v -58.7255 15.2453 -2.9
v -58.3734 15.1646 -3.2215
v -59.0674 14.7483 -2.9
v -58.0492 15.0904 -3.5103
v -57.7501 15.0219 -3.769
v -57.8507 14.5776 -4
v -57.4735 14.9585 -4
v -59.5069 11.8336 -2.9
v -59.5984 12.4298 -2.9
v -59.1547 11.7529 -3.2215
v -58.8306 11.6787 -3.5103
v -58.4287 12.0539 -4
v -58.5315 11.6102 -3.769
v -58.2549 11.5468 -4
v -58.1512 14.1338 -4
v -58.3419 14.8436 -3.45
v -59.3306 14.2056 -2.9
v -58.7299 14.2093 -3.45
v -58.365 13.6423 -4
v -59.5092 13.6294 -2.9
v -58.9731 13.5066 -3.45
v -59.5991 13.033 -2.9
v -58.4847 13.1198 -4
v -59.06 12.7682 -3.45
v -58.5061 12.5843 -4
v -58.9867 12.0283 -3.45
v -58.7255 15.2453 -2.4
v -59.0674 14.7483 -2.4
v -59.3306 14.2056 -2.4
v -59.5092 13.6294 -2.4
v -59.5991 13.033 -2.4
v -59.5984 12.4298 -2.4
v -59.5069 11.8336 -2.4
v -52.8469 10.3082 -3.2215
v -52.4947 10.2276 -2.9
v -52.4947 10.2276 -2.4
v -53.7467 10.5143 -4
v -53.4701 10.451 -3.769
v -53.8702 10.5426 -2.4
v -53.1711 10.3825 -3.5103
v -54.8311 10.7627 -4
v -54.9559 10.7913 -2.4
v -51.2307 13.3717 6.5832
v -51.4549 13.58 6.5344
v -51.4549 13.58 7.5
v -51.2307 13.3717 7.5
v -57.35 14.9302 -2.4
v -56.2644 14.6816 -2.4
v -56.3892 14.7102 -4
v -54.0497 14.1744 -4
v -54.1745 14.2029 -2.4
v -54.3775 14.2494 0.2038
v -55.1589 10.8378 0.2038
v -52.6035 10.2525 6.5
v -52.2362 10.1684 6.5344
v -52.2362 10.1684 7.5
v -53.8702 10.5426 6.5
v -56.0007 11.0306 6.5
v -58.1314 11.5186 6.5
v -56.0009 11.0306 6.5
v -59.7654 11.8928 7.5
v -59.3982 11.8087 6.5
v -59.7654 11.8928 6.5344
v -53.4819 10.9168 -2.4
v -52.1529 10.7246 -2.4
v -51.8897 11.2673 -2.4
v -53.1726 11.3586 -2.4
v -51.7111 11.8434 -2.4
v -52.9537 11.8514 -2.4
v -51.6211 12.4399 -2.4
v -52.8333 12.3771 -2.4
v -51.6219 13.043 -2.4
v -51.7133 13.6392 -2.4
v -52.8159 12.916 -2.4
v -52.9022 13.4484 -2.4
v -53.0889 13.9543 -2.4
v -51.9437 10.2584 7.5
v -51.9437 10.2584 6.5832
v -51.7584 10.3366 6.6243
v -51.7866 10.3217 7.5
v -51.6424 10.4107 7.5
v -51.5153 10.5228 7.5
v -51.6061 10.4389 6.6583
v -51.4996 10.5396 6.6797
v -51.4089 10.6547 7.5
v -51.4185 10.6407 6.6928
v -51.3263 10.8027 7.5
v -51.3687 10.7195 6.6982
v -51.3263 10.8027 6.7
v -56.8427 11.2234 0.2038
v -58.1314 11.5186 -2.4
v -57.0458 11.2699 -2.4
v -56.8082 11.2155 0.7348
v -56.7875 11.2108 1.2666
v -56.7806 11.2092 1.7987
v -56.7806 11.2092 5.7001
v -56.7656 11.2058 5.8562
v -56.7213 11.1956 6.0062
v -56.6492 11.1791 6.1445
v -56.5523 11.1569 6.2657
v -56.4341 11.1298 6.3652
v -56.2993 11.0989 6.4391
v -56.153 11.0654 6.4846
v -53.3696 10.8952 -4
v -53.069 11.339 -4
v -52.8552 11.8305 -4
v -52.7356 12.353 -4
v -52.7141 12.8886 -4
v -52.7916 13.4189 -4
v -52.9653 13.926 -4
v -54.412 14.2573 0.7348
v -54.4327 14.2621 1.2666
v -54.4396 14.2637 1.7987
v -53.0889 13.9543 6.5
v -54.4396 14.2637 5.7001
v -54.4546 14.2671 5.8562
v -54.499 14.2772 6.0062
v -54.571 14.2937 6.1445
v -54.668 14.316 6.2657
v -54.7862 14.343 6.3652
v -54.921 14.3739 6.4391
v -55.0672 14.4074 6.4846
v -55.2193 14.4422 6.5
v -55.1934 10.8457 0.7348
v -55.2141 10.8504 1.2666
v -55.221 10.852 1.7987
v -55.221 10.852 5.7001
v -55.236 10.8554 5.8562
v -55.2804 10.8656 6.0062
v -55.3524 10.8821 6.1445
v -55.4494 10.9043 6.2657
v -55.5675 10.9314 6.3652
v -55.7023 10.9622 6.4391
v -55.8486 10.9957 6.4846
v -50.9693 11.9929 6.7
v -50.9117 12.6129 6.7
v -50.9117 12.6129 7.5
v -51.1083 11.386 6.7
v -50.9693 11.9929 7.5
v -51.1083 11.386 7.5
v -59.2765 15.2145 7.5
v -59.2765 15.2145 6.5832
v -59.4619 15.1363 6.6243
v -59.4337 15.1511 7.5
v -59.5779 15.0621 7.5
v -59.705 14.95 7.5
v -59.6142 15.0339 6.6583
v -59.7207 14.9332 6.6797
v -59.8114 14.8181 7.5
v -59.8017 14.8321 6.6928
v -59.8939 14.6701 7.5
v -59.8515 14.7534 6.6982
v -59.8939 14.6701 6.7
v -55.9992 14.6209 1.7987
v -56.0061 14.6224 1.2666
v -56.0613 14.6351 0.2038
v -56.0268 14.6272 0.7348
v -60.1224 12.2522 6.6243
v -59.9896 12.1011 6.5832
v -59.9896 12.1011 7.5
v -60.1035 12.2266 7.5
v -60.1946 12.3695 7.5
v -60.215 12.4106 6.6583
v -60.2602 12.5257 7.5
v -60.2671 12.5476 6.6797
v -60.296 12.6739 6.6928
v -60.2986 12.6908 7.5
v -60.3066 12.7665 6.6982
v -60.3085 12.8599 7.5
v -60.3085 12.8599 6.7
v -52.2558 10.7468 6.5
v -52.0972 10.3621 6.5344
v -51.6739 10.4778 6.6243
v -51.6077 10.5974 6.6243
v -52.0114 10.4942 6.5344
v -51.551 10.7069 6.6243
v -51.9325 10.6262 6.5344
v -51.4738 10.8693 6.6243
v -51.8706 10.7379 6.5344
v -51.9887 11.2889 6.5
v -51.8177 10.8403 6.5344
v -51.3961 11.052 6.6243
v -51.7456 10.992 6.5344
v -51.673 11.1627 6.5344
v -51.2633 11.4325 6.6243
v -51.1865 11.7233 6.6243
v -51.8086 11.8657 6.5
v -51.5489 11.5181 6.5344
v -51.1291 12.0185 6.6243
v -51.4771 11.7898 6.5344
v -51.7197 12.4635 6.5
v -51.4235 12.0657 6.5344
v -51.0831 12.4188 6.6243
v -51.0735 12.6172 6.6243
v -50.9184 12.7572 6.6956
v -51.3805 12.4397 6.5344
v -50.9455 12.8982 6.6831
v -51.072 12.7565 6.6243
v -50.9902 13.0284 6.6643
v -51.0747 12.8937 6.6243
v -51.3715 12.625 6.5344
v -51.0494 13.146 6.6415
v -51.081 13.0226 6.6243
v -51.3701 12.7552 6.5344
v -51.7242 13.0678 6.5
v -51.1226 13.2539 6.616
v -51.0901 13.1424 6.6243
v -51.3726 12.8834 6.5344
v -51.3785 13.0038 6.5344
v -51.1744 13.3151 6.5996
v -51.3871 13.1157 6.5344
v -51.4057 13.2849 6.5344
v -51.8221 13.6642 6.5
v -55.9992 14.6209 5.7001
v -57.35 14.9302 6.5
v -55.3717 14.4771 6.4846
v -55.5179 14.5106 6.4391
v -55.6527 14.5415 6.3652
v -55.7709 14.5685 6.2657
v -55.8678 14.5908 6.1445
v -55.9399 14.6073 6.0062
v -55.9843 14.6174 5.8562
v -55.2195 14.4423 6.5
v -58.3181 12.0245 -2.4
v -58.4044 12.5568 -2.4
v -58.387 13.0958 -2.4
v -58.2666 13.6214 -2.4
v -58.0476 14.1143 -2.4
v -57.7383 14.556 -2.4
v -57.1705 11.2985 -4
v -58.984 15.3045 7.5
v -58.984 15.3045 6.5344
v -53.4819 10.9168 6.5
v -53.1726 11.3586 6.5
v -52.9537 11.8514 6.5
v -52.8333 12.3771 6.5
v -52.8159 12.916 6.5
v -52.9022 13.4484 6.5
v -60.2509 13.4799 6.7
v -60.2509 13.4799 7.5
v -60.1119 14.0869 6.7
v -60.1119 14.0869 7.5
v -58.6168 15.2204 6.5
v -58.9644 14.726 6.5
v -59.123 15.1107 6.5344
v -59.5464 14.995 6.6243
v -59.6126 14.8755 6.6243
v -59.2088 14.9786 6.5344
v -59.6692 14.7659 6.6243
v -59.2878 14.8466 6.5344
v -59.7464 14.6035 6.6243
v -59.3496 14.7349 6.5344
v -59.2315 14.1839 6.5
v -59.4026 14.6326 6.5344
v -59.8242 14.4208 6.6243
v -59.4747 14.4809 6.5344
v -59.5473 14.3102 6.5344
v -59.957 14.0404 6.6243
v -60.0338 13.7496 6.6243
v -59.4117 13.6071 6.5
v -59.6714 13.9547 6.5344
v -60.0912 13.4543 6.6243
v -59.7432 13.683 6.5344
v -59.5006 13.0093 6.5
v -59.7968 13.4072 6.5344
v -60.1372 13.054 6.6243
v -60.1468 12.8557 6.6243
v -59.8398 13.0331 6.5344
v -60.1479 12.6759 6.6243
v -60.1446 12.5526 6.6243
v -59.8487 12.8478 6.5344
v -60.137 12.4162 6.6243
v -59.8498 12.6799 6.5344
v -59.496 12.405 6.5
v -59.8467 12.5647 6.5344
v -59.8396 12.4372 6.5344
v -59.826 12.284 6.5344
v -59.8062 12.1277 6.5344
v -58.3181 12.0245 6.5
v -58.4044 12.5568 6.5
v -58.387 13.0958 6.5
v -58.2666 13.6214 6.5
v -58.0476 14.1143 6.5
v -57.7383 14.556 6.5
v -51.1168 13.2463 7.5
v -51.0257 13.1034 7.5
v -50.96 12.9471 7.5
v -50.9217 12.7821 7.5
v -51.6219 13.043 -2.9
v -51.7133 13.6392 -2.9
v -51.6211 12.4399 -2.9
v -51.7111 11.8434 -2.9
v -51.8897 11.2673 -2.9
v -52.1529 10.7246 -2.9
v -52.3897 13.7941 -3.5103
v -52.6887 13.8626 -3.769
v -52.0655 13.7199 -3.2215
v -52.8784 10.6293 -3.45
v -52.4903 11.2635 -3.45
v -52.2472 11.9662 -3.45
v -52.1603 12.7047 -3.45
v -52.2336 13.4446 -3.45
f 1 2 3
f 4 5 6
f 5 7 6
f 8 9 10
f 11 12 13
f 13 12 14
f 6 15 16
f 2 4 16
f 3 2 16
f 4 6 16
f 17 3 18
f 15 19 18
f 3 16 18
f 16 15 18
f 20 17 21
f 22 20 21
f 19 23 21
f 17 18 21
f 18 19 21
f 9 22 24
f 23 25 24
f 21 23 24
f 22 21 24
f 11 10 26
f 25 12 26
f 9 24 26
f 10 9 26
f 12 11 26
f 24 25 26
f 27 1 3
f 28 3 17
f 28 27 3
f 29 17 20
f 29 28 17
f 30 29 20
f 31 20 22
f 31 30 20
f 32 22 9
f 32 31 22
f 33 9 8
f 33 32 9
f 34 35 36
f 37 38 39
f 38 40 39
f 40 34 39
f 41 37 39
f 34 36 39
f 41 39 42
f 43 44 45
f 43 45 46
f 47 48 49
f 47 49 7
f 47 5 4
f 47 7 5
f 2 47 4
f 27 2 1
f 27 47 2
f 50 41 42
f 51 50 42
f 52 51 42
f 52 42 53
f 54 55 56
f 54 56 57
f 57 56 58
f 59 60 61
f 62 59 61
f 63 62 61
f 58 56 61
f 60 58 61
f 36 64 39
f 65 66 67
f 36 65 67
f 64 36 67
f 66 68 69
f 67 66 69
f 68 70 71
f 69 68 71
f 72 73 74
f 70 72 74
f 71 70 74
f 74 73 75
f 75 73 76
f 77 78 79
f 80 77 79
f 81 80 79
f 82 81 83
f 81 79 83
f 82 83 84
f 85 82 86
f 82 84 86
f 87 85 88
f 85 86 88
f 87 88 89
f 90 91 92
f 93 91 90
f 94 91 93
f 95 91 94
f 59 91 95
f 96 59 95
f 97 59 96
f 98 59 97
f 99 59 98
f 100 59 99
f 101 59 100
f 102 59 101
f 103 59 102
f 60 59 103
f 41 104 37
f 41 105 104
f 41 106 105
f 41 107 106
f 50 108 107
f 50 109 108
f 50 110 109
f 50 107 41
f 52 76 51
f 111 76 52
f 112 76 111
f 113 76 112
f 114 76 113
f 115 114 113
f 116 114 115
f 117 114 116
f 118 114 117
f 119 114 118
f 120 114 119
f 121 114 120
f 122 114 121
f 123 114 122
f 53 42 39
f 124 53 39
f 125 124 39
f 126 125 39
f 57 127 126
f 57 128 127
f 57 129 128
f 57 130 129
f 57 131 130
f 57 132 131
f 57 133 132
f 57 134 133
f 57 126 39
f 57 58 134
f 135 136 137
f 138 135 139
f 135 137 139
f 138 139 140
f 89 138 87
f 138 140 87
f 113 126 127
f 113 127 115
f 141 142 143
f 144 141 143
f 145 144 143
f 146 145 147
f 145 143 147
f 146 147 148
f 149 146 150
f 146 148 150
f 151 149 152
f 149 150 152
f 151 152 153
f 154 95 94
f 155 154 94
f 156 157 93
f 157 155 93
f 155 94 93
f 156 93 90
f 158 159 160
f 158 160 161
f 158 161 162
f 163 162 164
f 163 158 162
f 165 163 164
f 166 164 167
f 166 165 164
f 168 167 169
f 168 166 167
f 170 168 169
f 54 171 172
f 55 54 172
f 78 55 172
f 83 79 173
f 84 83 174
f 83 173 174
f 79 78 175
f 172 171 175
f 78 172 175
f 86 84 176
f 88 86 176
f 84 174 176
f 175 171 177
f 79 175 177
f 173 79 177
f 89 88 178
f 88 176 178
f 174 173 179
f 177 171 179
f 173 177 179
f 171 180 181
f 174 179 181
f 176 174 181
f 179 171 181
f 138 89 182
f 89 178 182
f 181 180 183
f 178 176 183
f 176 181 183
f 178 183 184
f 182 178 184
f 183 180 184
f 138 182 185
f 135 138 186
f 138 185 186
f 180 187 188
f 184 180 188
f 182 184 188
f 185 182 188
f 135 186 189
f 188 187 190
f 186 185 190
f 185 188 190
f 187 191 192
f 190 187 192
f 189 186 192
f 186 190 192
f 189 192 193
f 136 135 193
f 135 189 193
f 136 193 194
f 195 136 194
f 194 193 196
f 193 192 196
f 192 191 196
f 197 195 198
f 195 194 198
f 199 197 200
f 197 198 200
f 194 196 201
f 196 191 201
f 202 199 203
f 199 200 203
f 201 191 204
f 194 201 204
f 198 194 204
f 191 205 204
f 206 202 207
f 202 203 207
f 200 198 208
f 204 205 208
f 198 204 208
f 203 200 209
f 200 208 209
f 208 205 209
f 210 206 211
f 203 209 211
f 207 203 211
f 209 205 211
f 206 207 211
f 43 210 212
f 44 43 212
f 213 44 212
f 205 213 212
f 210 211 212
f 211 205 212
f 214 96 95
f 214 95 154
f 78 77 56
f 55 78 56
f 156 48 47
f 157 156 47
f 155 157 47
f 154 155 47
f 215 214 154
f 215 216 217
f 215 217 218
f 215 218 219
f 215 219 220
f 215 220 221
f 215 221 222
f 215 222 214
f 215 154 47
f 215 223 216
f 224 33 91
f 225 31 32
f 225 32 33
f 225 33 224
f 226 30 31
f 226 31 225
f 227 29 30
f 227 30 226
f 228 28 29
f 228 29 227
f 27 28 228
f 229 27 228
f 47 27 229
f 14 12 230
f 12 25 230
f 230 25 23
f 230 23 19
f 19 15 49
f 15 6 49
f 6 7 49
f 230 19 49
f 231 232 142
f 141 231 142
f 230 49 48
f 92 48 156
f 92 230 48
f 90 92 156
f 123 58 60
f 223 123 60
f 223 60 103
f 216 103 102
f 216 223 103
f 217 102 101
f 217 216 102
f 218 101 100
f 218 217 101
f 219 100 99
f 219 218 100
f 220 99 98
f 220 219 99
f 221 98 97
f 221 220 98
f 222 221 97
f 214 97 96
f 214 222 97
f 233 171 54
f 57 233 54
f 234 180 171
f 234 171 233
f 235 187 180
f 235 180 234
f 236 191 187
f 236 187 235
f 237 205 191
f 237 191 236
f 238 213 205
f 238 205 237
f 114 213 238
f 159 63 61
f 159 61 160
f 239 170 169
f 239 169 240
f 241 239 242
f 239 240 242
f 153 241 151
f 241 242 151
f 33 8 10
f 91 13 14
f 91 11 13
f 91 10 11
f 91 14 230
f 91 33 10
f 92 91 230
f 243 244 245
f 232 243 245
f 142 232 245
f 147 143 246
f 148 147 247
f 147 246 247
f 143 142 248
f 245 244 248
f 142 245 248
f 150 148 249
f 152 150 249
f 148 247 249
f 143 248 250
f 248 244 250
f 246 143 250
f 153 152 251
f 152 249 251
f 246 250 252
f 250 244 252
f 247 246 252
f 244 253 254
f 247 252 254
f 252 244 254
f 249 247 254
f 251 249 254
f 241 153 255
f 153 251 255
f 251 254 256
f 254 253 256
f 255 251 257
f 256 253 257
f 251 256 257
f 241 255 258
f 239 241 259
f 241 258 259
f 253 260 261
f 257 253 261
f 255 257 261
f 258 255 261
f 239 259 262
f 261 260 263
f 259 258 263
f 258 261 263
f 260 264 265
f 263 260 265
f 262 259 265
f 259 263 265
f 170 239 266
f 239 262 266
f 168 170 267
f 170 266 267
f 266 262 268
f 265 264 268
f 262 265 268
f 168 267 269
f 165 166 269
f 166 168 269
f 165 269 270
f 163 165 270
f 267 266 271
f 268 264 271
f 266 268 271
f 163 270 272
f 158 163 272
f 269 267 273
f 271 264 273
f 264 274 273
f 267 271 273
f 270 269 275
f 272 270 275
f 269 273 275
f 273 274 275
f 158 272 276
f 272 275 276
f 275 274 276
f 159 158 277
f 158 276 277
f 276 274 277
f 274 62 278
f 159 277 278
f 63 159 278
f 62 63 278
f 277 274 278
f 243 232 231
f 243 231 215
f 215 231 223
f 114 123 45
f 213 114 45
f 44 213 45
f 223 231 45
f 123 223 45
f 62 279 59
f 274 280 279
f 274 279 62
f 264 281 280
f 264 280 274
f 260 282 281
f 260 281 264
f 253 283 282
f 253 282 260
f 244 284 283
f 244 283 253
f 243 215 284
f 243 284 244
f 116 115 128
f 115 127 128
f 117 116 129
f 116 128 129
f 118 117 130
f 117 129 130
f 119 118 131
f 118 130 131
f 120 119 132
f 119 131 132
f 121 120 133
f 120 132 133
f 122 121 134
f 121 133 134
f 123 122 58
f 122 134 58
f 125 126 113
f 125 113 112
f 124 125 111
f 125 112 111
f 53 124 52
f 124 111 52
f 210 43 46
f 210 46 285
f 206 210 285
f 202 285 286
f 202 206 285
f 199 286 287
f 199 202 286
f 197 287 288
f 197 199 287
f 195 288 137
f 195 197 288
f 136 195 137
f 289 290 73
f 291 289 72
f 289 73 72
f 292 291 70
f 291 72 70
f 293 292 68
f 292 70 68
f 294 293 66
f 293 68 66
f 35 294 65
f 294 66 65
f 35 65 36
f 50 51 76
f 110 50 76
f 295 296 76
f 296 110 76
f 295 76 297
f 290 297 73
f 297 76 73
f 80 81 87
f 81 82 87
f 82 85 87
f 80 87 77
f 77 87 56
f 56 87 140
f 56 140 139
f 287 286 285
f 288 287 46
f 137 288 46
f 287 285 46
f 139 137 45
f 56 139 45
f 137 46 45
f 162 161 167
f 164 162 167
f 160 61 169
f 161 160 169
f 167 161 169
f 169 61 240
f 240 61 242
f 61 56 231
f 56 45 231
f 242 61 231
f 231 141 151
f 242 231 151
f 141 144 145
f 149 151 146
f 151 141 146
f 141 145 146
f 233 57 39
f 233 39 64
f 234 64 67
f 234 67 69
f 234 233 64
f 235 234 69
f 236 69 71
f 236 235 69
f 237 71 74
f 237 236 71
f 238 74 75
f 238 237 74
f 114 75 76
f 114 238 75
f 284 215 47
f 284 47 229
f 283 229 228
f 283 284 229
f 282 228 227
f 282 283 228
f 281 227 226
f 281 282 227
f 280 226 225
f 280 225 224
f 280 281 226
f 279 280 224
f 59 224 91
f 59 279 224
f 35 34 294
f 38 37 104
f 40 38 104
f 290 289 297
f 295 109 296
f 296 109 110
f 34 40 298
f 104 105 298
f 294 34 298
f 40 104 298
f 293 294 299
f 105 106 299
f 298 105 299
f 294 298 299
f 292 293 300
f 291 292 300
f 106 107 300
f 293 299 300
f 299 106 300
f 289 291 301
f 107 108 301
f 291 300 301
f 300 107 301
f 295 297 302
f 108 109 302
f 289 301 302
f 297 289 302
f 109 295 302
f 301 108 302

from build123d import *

# Parameters (mm, degrees)
BOSS_EXTRUDE1_DEPTH     = 1
CHAMFER1_SIZE           = 0.5
FILLET1_R               = 1
BOSS_EXTRUDE2_DEPTH     = 8.9
BOSS_EXTRUDE3_DEPTH     = 1.6
CUT_EXTRUDE1_DEPTH      = 63.654658492
CUT_EXTRUDE1_DEPTH_BACK = 63.654658492
FILLET2_R               = 20
FILLET3_R               = 0.8


# Some blends are built 0.0001 mm under size
with BuildPart() as part:
    # Sketch3 → Boss-Extrude1 (new body)
    with BuildSketch(Plane.XY.offset(7.5)):
        with BuildLine():
            Line((-59.471397705, 15.416079883), (-50.967479146, 13.468422533))
            ThreePointArc((-50.967479146, 13.468422533), (-51.028748516, 11.687143573), (-51.748854552, 10.056758353))
            Line((-51.748854552, 10.056758353), (-60.252773111, 12.004415704))
            ThreePointArc((-60.252773111, 12.004415704), (-60.191503741, 13.785694664), (-59.471397705, 15.416079883))
        make_face()
    extrude(amount=-BOSS_EXTRUDE1_DEPTH)

    # Chamfer1
    # the kernel refuses this chamfer: 0.5, 0.404802776 mm, written as the material it takes off along each edge
    with BuildSketch(Plane(origin=(-59.471397705, 15.416079883, 8.793542877), x_dir=(0.9747611941912204, -0.2232501160109568, 0), z_dir=(0, 0, -1))) as chamfer1_piece_1:
        with BuildLine():
            Line((CHAMFER1_SIZE, 0), (-0.128607842, 0.362926907))
            ThreePointArc((-0.128607842, 0.362926907), (-0.070555149, 0.18731274), (0, 0))
            Line((0, 0), (CHAMFER1_SIZE, 0))
        make_face()
    extrude(amount=3.587085755, mode=Mode.SUBTRACT)
    with BuildSketch(Plane(origin=(-50.967479146, 13.468422533, 8.793542877), x_dir=(-0.9747611941912215, 0.22325011601095288, 0), z_dir=(0, 0, -1)), Plane(origin=(-60.252773111, 12.004415704, 8.793542877), x_dir=(0.9747611941912214, -0.22325011601095318, 0), z_dir=(0, 0, -1))) as chamfer1_piece_2:
        with BuildLine():
            Line((CHAMFER1_SIZE, 0), (-0.128607842, -0.362926907))
            ThreePointArc((-0.128607842, -0.362926907), (-0.070555149, -0.18731274), (0, 0))
            Line((0, 0), (CHAMFER1_SIZE, 0))
        make_face()
    extrude(amount=3.587085755, mode=Mode.SUBTRACT)
    with BuildSketch(Plane(origin=(-51.748854552, 10.056758353, 8.793542877), x_dir=(0.5360100963407745, 0.8442115710061985, 0), z_dir=(0, 0, -1))) as chamfer1_piece_3:
        with BuildLine():
            Line((0.385040149, 0), (-CHAMFER1_SIZE * 0.334011510443, -CHAMFER1_SIZE * 0.942568995295))
            Line((-CHAMFER1_SIZE * 0.334011510443, -CHAMFER1_SIZE * 0.942568995295), (0, 0))
            ThreePointArc((0, 0), (0.200121413, 0.003938485), (0.385040149, 0))
        make_face()
    extrude(amount=3.587085755, mode=Mode.SUBTRACT)

    # Fillet1
    fillet1_edges = [part.edges().sort_by_distance(p)[0] for p in [
        (-50.923140687, 13.085943752, 7),
        (-51.542469145, 10.381813703, 7),
        (-59.677783112, 15.091024534, 7),
        (-60.29711157, 12.386894484, 7),
    ]]
    fillet(fillet1_edges, radius=FILLET1_R)

    # Sketch5 → Cut-Revolve1 (revolve, cut)
    with BuildSketch(Plane(origin=(0, 0, 0), x_dir=(0.9747611941912216, -0.22325011601095204, 0), z_dir=(0.22325011601095204, 0.9747611941912216, 0))):
        with BuildLine():
            Line((-60.95, -6.5), (-61.75, -6.5))
            Line((-61.75, -6.5), (-61.75, -6.7))
            ThreePointArc((-61.75, -6.7), (-61.362310563, -6.55075775), (-60.95, -6.5))
        make_face()
    revolve(axis=Axis((-55.610126129, 12.736419118, 6.5), (0, 0, 1)), mode=Mode.SUBTRACT)

    # Sketch6 → Boss-Extrude2 (add)
    with BuildSketch(Plane(origin=(0, 0, 6.5), x_dir=(-1, 0, 0), z_dir=(0, 0, -1))):
        with BuildLine():
            Line((58.131397429, 11.518555813), (56.780622787, 11.209187121))
            Line((56.780622787, 11.209187121), (55.999247381, 14.620851301))
            Line((55.999247381, 14.620851301), (57.350022023, 14.930219993))
            ThreePointArc((57.350022023, 14.930219993), (58.339457472, 13.361519443), (58.131397429, 11.518555813))
        make_face()
        with BuildLine():
            Line((55.221004876, 10.851986936), (53.870230234, 10.542618244))
            ThreePointArc((53.870230234, 10.542618244), (52.880794785, 12.111318794), (53.088854828, 13.954282424))
            Line((53.088854828, 13.954282424), (54.43962947, 14.263651115))
            Line((54.43962947, 14.263651115), (55.221004876, 10.851986936))
        make_face()
    extrude(amount=BOSS_EXTRUDE2_DEPTH)

    # Sketch7 → Boss-Extrude3 (add)
    with BuildSketch(Plane(origin=(0, 0, -2.4), x_dir=(-1, 0, 0), z_dir=(0, 0, -1))):
        with BuildLine():
            Line((54.43962947, 14.263651115), (51.713345578, 13.63924875))
            ThreePointArc((51.713345578, 13.63924875), (51.711081352, 11.843418654), (52.494720985, 10.227584571))
            Line((52.494720985, 10.227584571), (55.221004876, 10.851986936))
            Line((55.221004876, 10.851986936), (54.43962947, 14.263651115))
        make_face()
        with BuildLine():
            Line((55.999247381, 14.620851301), (58.725531273, 15.245253666))
            ThreePointArc((58.725531273, 15.245253666), (59.509170905, 13.629419582), (59.506906679, 11.833589487))
            Line((59.506906679, 11.833589487), (56.780622787, 11.209187121))
            Line((56.780622787, 11.209187121), (55.999247381, 14.620851301))
        make_face()
    extrude(amount=BOSS_EXTRUDE3_DEPTH)

    # Sketch8 → Cut-Revolve2 (revolve, cut)
    with BuildSketch(Plane(origin=(0, 0, 0), x_dir=(0.9747611941912216, -0.22325011601095204, 0), z_dir=(0.22325011601095204, 0.9747611941912216, 0))):
        Polygon((-61.05, 2.9), (-59.95, 4), (-61.05, 4), align=None)
    revolve(axis=Axis((-55.610126129, 12.736419118, 6.5), (0, 0, 1)), mode=Mode.SUBTRACT)

    # Sketch9 → Cut-Extrude1 (cut, two sides: drawn at the far end of the back side and taken through both)
    with BuildSketch(Plane(origin=(0.390687703, 1.70583209, 0), x_dir=(0.9747611941912216, -0.22325011601095204, 0), z_dir=(0.22325011601095204, 0.9747611941912216, 0)).offset(-CUT_EXTRUDE1_DEPTH_BACK)):
        Polygon((-58.25, 4), (-57.85, -1), (-57.85, 4), align=None)
        Polygon((-55.85, 4), (-56.25, -1), (-56.25, 4), align=None)
    extrude(amount=CUT_EXTRUDE1_DEPTH + CUT_EXTRUDE1_DEPTH_BACK, mode=Mode.SUBTRACT)

    # Fillet2
    # the kernel refuses this fillet: 20 mm, written as the material it takes off along each edge
    with BuildSketch(Plane(origin=(-53.993841362, 16.21006421, 1), x_dir=(0, 0, 1), z_dir=(-0.22325011601095204, -0.9747611941912216, 0))) as fillet2_piece_1:
        with BuildLine():
            CenterArc((FILLET2_R * 0.0399362039845, -FILLET2_R), FILLET2_R, 90, 4.57392126)
            Line((-FILLET2_R * 0.0398090182984, -FILLET2_R * 0.00318472146388), (0, 0))
            Line((0, 0), (FILLET2_R * 0.0399362039845, 0))
        make_face()
    extrude(amount=7.493620398, mode=Mode.SUBTRACT)
    with BuildSketch(Plane(origin=(-57.226410896, 9.262774027, 1), x_dir=(-0.07773254810353018, 0.01780313012597799, -0.9968152785361237), z_dir=(0.223250116010952, 0.9747611941912216, 0))) as fillet2_piece_2:
        with BuildLine():
            CenterArc((FILLET2_R * 0.0399362039845, FILLET2_R), FILLET2_R, 265.42607874, 4.57392126)
            Line((-FILLET2_R * 0.0398090182984, FILLET2_R * 0.00318472146388), (0, 0))
            Line((0, 0), (FILLET2_R * 0.0399362039845, 0))
        make_face()
    extrude(amount=7.493620398, mode=Mode.SUBTRACT)

    # Fillet3
    fillet3_edges = [part.edges().sort_by_distance(p)[0] for p in [
        (-54.830317173, 12.557819026, 6.5),
        (-56.389935084, 12.915019211, 6.5),
    ]]
    fillet(fillet3_edges, radius=FILLET3_R - 0.0001)  # a hair under: the kernel refuses the full size


solid = part.part
